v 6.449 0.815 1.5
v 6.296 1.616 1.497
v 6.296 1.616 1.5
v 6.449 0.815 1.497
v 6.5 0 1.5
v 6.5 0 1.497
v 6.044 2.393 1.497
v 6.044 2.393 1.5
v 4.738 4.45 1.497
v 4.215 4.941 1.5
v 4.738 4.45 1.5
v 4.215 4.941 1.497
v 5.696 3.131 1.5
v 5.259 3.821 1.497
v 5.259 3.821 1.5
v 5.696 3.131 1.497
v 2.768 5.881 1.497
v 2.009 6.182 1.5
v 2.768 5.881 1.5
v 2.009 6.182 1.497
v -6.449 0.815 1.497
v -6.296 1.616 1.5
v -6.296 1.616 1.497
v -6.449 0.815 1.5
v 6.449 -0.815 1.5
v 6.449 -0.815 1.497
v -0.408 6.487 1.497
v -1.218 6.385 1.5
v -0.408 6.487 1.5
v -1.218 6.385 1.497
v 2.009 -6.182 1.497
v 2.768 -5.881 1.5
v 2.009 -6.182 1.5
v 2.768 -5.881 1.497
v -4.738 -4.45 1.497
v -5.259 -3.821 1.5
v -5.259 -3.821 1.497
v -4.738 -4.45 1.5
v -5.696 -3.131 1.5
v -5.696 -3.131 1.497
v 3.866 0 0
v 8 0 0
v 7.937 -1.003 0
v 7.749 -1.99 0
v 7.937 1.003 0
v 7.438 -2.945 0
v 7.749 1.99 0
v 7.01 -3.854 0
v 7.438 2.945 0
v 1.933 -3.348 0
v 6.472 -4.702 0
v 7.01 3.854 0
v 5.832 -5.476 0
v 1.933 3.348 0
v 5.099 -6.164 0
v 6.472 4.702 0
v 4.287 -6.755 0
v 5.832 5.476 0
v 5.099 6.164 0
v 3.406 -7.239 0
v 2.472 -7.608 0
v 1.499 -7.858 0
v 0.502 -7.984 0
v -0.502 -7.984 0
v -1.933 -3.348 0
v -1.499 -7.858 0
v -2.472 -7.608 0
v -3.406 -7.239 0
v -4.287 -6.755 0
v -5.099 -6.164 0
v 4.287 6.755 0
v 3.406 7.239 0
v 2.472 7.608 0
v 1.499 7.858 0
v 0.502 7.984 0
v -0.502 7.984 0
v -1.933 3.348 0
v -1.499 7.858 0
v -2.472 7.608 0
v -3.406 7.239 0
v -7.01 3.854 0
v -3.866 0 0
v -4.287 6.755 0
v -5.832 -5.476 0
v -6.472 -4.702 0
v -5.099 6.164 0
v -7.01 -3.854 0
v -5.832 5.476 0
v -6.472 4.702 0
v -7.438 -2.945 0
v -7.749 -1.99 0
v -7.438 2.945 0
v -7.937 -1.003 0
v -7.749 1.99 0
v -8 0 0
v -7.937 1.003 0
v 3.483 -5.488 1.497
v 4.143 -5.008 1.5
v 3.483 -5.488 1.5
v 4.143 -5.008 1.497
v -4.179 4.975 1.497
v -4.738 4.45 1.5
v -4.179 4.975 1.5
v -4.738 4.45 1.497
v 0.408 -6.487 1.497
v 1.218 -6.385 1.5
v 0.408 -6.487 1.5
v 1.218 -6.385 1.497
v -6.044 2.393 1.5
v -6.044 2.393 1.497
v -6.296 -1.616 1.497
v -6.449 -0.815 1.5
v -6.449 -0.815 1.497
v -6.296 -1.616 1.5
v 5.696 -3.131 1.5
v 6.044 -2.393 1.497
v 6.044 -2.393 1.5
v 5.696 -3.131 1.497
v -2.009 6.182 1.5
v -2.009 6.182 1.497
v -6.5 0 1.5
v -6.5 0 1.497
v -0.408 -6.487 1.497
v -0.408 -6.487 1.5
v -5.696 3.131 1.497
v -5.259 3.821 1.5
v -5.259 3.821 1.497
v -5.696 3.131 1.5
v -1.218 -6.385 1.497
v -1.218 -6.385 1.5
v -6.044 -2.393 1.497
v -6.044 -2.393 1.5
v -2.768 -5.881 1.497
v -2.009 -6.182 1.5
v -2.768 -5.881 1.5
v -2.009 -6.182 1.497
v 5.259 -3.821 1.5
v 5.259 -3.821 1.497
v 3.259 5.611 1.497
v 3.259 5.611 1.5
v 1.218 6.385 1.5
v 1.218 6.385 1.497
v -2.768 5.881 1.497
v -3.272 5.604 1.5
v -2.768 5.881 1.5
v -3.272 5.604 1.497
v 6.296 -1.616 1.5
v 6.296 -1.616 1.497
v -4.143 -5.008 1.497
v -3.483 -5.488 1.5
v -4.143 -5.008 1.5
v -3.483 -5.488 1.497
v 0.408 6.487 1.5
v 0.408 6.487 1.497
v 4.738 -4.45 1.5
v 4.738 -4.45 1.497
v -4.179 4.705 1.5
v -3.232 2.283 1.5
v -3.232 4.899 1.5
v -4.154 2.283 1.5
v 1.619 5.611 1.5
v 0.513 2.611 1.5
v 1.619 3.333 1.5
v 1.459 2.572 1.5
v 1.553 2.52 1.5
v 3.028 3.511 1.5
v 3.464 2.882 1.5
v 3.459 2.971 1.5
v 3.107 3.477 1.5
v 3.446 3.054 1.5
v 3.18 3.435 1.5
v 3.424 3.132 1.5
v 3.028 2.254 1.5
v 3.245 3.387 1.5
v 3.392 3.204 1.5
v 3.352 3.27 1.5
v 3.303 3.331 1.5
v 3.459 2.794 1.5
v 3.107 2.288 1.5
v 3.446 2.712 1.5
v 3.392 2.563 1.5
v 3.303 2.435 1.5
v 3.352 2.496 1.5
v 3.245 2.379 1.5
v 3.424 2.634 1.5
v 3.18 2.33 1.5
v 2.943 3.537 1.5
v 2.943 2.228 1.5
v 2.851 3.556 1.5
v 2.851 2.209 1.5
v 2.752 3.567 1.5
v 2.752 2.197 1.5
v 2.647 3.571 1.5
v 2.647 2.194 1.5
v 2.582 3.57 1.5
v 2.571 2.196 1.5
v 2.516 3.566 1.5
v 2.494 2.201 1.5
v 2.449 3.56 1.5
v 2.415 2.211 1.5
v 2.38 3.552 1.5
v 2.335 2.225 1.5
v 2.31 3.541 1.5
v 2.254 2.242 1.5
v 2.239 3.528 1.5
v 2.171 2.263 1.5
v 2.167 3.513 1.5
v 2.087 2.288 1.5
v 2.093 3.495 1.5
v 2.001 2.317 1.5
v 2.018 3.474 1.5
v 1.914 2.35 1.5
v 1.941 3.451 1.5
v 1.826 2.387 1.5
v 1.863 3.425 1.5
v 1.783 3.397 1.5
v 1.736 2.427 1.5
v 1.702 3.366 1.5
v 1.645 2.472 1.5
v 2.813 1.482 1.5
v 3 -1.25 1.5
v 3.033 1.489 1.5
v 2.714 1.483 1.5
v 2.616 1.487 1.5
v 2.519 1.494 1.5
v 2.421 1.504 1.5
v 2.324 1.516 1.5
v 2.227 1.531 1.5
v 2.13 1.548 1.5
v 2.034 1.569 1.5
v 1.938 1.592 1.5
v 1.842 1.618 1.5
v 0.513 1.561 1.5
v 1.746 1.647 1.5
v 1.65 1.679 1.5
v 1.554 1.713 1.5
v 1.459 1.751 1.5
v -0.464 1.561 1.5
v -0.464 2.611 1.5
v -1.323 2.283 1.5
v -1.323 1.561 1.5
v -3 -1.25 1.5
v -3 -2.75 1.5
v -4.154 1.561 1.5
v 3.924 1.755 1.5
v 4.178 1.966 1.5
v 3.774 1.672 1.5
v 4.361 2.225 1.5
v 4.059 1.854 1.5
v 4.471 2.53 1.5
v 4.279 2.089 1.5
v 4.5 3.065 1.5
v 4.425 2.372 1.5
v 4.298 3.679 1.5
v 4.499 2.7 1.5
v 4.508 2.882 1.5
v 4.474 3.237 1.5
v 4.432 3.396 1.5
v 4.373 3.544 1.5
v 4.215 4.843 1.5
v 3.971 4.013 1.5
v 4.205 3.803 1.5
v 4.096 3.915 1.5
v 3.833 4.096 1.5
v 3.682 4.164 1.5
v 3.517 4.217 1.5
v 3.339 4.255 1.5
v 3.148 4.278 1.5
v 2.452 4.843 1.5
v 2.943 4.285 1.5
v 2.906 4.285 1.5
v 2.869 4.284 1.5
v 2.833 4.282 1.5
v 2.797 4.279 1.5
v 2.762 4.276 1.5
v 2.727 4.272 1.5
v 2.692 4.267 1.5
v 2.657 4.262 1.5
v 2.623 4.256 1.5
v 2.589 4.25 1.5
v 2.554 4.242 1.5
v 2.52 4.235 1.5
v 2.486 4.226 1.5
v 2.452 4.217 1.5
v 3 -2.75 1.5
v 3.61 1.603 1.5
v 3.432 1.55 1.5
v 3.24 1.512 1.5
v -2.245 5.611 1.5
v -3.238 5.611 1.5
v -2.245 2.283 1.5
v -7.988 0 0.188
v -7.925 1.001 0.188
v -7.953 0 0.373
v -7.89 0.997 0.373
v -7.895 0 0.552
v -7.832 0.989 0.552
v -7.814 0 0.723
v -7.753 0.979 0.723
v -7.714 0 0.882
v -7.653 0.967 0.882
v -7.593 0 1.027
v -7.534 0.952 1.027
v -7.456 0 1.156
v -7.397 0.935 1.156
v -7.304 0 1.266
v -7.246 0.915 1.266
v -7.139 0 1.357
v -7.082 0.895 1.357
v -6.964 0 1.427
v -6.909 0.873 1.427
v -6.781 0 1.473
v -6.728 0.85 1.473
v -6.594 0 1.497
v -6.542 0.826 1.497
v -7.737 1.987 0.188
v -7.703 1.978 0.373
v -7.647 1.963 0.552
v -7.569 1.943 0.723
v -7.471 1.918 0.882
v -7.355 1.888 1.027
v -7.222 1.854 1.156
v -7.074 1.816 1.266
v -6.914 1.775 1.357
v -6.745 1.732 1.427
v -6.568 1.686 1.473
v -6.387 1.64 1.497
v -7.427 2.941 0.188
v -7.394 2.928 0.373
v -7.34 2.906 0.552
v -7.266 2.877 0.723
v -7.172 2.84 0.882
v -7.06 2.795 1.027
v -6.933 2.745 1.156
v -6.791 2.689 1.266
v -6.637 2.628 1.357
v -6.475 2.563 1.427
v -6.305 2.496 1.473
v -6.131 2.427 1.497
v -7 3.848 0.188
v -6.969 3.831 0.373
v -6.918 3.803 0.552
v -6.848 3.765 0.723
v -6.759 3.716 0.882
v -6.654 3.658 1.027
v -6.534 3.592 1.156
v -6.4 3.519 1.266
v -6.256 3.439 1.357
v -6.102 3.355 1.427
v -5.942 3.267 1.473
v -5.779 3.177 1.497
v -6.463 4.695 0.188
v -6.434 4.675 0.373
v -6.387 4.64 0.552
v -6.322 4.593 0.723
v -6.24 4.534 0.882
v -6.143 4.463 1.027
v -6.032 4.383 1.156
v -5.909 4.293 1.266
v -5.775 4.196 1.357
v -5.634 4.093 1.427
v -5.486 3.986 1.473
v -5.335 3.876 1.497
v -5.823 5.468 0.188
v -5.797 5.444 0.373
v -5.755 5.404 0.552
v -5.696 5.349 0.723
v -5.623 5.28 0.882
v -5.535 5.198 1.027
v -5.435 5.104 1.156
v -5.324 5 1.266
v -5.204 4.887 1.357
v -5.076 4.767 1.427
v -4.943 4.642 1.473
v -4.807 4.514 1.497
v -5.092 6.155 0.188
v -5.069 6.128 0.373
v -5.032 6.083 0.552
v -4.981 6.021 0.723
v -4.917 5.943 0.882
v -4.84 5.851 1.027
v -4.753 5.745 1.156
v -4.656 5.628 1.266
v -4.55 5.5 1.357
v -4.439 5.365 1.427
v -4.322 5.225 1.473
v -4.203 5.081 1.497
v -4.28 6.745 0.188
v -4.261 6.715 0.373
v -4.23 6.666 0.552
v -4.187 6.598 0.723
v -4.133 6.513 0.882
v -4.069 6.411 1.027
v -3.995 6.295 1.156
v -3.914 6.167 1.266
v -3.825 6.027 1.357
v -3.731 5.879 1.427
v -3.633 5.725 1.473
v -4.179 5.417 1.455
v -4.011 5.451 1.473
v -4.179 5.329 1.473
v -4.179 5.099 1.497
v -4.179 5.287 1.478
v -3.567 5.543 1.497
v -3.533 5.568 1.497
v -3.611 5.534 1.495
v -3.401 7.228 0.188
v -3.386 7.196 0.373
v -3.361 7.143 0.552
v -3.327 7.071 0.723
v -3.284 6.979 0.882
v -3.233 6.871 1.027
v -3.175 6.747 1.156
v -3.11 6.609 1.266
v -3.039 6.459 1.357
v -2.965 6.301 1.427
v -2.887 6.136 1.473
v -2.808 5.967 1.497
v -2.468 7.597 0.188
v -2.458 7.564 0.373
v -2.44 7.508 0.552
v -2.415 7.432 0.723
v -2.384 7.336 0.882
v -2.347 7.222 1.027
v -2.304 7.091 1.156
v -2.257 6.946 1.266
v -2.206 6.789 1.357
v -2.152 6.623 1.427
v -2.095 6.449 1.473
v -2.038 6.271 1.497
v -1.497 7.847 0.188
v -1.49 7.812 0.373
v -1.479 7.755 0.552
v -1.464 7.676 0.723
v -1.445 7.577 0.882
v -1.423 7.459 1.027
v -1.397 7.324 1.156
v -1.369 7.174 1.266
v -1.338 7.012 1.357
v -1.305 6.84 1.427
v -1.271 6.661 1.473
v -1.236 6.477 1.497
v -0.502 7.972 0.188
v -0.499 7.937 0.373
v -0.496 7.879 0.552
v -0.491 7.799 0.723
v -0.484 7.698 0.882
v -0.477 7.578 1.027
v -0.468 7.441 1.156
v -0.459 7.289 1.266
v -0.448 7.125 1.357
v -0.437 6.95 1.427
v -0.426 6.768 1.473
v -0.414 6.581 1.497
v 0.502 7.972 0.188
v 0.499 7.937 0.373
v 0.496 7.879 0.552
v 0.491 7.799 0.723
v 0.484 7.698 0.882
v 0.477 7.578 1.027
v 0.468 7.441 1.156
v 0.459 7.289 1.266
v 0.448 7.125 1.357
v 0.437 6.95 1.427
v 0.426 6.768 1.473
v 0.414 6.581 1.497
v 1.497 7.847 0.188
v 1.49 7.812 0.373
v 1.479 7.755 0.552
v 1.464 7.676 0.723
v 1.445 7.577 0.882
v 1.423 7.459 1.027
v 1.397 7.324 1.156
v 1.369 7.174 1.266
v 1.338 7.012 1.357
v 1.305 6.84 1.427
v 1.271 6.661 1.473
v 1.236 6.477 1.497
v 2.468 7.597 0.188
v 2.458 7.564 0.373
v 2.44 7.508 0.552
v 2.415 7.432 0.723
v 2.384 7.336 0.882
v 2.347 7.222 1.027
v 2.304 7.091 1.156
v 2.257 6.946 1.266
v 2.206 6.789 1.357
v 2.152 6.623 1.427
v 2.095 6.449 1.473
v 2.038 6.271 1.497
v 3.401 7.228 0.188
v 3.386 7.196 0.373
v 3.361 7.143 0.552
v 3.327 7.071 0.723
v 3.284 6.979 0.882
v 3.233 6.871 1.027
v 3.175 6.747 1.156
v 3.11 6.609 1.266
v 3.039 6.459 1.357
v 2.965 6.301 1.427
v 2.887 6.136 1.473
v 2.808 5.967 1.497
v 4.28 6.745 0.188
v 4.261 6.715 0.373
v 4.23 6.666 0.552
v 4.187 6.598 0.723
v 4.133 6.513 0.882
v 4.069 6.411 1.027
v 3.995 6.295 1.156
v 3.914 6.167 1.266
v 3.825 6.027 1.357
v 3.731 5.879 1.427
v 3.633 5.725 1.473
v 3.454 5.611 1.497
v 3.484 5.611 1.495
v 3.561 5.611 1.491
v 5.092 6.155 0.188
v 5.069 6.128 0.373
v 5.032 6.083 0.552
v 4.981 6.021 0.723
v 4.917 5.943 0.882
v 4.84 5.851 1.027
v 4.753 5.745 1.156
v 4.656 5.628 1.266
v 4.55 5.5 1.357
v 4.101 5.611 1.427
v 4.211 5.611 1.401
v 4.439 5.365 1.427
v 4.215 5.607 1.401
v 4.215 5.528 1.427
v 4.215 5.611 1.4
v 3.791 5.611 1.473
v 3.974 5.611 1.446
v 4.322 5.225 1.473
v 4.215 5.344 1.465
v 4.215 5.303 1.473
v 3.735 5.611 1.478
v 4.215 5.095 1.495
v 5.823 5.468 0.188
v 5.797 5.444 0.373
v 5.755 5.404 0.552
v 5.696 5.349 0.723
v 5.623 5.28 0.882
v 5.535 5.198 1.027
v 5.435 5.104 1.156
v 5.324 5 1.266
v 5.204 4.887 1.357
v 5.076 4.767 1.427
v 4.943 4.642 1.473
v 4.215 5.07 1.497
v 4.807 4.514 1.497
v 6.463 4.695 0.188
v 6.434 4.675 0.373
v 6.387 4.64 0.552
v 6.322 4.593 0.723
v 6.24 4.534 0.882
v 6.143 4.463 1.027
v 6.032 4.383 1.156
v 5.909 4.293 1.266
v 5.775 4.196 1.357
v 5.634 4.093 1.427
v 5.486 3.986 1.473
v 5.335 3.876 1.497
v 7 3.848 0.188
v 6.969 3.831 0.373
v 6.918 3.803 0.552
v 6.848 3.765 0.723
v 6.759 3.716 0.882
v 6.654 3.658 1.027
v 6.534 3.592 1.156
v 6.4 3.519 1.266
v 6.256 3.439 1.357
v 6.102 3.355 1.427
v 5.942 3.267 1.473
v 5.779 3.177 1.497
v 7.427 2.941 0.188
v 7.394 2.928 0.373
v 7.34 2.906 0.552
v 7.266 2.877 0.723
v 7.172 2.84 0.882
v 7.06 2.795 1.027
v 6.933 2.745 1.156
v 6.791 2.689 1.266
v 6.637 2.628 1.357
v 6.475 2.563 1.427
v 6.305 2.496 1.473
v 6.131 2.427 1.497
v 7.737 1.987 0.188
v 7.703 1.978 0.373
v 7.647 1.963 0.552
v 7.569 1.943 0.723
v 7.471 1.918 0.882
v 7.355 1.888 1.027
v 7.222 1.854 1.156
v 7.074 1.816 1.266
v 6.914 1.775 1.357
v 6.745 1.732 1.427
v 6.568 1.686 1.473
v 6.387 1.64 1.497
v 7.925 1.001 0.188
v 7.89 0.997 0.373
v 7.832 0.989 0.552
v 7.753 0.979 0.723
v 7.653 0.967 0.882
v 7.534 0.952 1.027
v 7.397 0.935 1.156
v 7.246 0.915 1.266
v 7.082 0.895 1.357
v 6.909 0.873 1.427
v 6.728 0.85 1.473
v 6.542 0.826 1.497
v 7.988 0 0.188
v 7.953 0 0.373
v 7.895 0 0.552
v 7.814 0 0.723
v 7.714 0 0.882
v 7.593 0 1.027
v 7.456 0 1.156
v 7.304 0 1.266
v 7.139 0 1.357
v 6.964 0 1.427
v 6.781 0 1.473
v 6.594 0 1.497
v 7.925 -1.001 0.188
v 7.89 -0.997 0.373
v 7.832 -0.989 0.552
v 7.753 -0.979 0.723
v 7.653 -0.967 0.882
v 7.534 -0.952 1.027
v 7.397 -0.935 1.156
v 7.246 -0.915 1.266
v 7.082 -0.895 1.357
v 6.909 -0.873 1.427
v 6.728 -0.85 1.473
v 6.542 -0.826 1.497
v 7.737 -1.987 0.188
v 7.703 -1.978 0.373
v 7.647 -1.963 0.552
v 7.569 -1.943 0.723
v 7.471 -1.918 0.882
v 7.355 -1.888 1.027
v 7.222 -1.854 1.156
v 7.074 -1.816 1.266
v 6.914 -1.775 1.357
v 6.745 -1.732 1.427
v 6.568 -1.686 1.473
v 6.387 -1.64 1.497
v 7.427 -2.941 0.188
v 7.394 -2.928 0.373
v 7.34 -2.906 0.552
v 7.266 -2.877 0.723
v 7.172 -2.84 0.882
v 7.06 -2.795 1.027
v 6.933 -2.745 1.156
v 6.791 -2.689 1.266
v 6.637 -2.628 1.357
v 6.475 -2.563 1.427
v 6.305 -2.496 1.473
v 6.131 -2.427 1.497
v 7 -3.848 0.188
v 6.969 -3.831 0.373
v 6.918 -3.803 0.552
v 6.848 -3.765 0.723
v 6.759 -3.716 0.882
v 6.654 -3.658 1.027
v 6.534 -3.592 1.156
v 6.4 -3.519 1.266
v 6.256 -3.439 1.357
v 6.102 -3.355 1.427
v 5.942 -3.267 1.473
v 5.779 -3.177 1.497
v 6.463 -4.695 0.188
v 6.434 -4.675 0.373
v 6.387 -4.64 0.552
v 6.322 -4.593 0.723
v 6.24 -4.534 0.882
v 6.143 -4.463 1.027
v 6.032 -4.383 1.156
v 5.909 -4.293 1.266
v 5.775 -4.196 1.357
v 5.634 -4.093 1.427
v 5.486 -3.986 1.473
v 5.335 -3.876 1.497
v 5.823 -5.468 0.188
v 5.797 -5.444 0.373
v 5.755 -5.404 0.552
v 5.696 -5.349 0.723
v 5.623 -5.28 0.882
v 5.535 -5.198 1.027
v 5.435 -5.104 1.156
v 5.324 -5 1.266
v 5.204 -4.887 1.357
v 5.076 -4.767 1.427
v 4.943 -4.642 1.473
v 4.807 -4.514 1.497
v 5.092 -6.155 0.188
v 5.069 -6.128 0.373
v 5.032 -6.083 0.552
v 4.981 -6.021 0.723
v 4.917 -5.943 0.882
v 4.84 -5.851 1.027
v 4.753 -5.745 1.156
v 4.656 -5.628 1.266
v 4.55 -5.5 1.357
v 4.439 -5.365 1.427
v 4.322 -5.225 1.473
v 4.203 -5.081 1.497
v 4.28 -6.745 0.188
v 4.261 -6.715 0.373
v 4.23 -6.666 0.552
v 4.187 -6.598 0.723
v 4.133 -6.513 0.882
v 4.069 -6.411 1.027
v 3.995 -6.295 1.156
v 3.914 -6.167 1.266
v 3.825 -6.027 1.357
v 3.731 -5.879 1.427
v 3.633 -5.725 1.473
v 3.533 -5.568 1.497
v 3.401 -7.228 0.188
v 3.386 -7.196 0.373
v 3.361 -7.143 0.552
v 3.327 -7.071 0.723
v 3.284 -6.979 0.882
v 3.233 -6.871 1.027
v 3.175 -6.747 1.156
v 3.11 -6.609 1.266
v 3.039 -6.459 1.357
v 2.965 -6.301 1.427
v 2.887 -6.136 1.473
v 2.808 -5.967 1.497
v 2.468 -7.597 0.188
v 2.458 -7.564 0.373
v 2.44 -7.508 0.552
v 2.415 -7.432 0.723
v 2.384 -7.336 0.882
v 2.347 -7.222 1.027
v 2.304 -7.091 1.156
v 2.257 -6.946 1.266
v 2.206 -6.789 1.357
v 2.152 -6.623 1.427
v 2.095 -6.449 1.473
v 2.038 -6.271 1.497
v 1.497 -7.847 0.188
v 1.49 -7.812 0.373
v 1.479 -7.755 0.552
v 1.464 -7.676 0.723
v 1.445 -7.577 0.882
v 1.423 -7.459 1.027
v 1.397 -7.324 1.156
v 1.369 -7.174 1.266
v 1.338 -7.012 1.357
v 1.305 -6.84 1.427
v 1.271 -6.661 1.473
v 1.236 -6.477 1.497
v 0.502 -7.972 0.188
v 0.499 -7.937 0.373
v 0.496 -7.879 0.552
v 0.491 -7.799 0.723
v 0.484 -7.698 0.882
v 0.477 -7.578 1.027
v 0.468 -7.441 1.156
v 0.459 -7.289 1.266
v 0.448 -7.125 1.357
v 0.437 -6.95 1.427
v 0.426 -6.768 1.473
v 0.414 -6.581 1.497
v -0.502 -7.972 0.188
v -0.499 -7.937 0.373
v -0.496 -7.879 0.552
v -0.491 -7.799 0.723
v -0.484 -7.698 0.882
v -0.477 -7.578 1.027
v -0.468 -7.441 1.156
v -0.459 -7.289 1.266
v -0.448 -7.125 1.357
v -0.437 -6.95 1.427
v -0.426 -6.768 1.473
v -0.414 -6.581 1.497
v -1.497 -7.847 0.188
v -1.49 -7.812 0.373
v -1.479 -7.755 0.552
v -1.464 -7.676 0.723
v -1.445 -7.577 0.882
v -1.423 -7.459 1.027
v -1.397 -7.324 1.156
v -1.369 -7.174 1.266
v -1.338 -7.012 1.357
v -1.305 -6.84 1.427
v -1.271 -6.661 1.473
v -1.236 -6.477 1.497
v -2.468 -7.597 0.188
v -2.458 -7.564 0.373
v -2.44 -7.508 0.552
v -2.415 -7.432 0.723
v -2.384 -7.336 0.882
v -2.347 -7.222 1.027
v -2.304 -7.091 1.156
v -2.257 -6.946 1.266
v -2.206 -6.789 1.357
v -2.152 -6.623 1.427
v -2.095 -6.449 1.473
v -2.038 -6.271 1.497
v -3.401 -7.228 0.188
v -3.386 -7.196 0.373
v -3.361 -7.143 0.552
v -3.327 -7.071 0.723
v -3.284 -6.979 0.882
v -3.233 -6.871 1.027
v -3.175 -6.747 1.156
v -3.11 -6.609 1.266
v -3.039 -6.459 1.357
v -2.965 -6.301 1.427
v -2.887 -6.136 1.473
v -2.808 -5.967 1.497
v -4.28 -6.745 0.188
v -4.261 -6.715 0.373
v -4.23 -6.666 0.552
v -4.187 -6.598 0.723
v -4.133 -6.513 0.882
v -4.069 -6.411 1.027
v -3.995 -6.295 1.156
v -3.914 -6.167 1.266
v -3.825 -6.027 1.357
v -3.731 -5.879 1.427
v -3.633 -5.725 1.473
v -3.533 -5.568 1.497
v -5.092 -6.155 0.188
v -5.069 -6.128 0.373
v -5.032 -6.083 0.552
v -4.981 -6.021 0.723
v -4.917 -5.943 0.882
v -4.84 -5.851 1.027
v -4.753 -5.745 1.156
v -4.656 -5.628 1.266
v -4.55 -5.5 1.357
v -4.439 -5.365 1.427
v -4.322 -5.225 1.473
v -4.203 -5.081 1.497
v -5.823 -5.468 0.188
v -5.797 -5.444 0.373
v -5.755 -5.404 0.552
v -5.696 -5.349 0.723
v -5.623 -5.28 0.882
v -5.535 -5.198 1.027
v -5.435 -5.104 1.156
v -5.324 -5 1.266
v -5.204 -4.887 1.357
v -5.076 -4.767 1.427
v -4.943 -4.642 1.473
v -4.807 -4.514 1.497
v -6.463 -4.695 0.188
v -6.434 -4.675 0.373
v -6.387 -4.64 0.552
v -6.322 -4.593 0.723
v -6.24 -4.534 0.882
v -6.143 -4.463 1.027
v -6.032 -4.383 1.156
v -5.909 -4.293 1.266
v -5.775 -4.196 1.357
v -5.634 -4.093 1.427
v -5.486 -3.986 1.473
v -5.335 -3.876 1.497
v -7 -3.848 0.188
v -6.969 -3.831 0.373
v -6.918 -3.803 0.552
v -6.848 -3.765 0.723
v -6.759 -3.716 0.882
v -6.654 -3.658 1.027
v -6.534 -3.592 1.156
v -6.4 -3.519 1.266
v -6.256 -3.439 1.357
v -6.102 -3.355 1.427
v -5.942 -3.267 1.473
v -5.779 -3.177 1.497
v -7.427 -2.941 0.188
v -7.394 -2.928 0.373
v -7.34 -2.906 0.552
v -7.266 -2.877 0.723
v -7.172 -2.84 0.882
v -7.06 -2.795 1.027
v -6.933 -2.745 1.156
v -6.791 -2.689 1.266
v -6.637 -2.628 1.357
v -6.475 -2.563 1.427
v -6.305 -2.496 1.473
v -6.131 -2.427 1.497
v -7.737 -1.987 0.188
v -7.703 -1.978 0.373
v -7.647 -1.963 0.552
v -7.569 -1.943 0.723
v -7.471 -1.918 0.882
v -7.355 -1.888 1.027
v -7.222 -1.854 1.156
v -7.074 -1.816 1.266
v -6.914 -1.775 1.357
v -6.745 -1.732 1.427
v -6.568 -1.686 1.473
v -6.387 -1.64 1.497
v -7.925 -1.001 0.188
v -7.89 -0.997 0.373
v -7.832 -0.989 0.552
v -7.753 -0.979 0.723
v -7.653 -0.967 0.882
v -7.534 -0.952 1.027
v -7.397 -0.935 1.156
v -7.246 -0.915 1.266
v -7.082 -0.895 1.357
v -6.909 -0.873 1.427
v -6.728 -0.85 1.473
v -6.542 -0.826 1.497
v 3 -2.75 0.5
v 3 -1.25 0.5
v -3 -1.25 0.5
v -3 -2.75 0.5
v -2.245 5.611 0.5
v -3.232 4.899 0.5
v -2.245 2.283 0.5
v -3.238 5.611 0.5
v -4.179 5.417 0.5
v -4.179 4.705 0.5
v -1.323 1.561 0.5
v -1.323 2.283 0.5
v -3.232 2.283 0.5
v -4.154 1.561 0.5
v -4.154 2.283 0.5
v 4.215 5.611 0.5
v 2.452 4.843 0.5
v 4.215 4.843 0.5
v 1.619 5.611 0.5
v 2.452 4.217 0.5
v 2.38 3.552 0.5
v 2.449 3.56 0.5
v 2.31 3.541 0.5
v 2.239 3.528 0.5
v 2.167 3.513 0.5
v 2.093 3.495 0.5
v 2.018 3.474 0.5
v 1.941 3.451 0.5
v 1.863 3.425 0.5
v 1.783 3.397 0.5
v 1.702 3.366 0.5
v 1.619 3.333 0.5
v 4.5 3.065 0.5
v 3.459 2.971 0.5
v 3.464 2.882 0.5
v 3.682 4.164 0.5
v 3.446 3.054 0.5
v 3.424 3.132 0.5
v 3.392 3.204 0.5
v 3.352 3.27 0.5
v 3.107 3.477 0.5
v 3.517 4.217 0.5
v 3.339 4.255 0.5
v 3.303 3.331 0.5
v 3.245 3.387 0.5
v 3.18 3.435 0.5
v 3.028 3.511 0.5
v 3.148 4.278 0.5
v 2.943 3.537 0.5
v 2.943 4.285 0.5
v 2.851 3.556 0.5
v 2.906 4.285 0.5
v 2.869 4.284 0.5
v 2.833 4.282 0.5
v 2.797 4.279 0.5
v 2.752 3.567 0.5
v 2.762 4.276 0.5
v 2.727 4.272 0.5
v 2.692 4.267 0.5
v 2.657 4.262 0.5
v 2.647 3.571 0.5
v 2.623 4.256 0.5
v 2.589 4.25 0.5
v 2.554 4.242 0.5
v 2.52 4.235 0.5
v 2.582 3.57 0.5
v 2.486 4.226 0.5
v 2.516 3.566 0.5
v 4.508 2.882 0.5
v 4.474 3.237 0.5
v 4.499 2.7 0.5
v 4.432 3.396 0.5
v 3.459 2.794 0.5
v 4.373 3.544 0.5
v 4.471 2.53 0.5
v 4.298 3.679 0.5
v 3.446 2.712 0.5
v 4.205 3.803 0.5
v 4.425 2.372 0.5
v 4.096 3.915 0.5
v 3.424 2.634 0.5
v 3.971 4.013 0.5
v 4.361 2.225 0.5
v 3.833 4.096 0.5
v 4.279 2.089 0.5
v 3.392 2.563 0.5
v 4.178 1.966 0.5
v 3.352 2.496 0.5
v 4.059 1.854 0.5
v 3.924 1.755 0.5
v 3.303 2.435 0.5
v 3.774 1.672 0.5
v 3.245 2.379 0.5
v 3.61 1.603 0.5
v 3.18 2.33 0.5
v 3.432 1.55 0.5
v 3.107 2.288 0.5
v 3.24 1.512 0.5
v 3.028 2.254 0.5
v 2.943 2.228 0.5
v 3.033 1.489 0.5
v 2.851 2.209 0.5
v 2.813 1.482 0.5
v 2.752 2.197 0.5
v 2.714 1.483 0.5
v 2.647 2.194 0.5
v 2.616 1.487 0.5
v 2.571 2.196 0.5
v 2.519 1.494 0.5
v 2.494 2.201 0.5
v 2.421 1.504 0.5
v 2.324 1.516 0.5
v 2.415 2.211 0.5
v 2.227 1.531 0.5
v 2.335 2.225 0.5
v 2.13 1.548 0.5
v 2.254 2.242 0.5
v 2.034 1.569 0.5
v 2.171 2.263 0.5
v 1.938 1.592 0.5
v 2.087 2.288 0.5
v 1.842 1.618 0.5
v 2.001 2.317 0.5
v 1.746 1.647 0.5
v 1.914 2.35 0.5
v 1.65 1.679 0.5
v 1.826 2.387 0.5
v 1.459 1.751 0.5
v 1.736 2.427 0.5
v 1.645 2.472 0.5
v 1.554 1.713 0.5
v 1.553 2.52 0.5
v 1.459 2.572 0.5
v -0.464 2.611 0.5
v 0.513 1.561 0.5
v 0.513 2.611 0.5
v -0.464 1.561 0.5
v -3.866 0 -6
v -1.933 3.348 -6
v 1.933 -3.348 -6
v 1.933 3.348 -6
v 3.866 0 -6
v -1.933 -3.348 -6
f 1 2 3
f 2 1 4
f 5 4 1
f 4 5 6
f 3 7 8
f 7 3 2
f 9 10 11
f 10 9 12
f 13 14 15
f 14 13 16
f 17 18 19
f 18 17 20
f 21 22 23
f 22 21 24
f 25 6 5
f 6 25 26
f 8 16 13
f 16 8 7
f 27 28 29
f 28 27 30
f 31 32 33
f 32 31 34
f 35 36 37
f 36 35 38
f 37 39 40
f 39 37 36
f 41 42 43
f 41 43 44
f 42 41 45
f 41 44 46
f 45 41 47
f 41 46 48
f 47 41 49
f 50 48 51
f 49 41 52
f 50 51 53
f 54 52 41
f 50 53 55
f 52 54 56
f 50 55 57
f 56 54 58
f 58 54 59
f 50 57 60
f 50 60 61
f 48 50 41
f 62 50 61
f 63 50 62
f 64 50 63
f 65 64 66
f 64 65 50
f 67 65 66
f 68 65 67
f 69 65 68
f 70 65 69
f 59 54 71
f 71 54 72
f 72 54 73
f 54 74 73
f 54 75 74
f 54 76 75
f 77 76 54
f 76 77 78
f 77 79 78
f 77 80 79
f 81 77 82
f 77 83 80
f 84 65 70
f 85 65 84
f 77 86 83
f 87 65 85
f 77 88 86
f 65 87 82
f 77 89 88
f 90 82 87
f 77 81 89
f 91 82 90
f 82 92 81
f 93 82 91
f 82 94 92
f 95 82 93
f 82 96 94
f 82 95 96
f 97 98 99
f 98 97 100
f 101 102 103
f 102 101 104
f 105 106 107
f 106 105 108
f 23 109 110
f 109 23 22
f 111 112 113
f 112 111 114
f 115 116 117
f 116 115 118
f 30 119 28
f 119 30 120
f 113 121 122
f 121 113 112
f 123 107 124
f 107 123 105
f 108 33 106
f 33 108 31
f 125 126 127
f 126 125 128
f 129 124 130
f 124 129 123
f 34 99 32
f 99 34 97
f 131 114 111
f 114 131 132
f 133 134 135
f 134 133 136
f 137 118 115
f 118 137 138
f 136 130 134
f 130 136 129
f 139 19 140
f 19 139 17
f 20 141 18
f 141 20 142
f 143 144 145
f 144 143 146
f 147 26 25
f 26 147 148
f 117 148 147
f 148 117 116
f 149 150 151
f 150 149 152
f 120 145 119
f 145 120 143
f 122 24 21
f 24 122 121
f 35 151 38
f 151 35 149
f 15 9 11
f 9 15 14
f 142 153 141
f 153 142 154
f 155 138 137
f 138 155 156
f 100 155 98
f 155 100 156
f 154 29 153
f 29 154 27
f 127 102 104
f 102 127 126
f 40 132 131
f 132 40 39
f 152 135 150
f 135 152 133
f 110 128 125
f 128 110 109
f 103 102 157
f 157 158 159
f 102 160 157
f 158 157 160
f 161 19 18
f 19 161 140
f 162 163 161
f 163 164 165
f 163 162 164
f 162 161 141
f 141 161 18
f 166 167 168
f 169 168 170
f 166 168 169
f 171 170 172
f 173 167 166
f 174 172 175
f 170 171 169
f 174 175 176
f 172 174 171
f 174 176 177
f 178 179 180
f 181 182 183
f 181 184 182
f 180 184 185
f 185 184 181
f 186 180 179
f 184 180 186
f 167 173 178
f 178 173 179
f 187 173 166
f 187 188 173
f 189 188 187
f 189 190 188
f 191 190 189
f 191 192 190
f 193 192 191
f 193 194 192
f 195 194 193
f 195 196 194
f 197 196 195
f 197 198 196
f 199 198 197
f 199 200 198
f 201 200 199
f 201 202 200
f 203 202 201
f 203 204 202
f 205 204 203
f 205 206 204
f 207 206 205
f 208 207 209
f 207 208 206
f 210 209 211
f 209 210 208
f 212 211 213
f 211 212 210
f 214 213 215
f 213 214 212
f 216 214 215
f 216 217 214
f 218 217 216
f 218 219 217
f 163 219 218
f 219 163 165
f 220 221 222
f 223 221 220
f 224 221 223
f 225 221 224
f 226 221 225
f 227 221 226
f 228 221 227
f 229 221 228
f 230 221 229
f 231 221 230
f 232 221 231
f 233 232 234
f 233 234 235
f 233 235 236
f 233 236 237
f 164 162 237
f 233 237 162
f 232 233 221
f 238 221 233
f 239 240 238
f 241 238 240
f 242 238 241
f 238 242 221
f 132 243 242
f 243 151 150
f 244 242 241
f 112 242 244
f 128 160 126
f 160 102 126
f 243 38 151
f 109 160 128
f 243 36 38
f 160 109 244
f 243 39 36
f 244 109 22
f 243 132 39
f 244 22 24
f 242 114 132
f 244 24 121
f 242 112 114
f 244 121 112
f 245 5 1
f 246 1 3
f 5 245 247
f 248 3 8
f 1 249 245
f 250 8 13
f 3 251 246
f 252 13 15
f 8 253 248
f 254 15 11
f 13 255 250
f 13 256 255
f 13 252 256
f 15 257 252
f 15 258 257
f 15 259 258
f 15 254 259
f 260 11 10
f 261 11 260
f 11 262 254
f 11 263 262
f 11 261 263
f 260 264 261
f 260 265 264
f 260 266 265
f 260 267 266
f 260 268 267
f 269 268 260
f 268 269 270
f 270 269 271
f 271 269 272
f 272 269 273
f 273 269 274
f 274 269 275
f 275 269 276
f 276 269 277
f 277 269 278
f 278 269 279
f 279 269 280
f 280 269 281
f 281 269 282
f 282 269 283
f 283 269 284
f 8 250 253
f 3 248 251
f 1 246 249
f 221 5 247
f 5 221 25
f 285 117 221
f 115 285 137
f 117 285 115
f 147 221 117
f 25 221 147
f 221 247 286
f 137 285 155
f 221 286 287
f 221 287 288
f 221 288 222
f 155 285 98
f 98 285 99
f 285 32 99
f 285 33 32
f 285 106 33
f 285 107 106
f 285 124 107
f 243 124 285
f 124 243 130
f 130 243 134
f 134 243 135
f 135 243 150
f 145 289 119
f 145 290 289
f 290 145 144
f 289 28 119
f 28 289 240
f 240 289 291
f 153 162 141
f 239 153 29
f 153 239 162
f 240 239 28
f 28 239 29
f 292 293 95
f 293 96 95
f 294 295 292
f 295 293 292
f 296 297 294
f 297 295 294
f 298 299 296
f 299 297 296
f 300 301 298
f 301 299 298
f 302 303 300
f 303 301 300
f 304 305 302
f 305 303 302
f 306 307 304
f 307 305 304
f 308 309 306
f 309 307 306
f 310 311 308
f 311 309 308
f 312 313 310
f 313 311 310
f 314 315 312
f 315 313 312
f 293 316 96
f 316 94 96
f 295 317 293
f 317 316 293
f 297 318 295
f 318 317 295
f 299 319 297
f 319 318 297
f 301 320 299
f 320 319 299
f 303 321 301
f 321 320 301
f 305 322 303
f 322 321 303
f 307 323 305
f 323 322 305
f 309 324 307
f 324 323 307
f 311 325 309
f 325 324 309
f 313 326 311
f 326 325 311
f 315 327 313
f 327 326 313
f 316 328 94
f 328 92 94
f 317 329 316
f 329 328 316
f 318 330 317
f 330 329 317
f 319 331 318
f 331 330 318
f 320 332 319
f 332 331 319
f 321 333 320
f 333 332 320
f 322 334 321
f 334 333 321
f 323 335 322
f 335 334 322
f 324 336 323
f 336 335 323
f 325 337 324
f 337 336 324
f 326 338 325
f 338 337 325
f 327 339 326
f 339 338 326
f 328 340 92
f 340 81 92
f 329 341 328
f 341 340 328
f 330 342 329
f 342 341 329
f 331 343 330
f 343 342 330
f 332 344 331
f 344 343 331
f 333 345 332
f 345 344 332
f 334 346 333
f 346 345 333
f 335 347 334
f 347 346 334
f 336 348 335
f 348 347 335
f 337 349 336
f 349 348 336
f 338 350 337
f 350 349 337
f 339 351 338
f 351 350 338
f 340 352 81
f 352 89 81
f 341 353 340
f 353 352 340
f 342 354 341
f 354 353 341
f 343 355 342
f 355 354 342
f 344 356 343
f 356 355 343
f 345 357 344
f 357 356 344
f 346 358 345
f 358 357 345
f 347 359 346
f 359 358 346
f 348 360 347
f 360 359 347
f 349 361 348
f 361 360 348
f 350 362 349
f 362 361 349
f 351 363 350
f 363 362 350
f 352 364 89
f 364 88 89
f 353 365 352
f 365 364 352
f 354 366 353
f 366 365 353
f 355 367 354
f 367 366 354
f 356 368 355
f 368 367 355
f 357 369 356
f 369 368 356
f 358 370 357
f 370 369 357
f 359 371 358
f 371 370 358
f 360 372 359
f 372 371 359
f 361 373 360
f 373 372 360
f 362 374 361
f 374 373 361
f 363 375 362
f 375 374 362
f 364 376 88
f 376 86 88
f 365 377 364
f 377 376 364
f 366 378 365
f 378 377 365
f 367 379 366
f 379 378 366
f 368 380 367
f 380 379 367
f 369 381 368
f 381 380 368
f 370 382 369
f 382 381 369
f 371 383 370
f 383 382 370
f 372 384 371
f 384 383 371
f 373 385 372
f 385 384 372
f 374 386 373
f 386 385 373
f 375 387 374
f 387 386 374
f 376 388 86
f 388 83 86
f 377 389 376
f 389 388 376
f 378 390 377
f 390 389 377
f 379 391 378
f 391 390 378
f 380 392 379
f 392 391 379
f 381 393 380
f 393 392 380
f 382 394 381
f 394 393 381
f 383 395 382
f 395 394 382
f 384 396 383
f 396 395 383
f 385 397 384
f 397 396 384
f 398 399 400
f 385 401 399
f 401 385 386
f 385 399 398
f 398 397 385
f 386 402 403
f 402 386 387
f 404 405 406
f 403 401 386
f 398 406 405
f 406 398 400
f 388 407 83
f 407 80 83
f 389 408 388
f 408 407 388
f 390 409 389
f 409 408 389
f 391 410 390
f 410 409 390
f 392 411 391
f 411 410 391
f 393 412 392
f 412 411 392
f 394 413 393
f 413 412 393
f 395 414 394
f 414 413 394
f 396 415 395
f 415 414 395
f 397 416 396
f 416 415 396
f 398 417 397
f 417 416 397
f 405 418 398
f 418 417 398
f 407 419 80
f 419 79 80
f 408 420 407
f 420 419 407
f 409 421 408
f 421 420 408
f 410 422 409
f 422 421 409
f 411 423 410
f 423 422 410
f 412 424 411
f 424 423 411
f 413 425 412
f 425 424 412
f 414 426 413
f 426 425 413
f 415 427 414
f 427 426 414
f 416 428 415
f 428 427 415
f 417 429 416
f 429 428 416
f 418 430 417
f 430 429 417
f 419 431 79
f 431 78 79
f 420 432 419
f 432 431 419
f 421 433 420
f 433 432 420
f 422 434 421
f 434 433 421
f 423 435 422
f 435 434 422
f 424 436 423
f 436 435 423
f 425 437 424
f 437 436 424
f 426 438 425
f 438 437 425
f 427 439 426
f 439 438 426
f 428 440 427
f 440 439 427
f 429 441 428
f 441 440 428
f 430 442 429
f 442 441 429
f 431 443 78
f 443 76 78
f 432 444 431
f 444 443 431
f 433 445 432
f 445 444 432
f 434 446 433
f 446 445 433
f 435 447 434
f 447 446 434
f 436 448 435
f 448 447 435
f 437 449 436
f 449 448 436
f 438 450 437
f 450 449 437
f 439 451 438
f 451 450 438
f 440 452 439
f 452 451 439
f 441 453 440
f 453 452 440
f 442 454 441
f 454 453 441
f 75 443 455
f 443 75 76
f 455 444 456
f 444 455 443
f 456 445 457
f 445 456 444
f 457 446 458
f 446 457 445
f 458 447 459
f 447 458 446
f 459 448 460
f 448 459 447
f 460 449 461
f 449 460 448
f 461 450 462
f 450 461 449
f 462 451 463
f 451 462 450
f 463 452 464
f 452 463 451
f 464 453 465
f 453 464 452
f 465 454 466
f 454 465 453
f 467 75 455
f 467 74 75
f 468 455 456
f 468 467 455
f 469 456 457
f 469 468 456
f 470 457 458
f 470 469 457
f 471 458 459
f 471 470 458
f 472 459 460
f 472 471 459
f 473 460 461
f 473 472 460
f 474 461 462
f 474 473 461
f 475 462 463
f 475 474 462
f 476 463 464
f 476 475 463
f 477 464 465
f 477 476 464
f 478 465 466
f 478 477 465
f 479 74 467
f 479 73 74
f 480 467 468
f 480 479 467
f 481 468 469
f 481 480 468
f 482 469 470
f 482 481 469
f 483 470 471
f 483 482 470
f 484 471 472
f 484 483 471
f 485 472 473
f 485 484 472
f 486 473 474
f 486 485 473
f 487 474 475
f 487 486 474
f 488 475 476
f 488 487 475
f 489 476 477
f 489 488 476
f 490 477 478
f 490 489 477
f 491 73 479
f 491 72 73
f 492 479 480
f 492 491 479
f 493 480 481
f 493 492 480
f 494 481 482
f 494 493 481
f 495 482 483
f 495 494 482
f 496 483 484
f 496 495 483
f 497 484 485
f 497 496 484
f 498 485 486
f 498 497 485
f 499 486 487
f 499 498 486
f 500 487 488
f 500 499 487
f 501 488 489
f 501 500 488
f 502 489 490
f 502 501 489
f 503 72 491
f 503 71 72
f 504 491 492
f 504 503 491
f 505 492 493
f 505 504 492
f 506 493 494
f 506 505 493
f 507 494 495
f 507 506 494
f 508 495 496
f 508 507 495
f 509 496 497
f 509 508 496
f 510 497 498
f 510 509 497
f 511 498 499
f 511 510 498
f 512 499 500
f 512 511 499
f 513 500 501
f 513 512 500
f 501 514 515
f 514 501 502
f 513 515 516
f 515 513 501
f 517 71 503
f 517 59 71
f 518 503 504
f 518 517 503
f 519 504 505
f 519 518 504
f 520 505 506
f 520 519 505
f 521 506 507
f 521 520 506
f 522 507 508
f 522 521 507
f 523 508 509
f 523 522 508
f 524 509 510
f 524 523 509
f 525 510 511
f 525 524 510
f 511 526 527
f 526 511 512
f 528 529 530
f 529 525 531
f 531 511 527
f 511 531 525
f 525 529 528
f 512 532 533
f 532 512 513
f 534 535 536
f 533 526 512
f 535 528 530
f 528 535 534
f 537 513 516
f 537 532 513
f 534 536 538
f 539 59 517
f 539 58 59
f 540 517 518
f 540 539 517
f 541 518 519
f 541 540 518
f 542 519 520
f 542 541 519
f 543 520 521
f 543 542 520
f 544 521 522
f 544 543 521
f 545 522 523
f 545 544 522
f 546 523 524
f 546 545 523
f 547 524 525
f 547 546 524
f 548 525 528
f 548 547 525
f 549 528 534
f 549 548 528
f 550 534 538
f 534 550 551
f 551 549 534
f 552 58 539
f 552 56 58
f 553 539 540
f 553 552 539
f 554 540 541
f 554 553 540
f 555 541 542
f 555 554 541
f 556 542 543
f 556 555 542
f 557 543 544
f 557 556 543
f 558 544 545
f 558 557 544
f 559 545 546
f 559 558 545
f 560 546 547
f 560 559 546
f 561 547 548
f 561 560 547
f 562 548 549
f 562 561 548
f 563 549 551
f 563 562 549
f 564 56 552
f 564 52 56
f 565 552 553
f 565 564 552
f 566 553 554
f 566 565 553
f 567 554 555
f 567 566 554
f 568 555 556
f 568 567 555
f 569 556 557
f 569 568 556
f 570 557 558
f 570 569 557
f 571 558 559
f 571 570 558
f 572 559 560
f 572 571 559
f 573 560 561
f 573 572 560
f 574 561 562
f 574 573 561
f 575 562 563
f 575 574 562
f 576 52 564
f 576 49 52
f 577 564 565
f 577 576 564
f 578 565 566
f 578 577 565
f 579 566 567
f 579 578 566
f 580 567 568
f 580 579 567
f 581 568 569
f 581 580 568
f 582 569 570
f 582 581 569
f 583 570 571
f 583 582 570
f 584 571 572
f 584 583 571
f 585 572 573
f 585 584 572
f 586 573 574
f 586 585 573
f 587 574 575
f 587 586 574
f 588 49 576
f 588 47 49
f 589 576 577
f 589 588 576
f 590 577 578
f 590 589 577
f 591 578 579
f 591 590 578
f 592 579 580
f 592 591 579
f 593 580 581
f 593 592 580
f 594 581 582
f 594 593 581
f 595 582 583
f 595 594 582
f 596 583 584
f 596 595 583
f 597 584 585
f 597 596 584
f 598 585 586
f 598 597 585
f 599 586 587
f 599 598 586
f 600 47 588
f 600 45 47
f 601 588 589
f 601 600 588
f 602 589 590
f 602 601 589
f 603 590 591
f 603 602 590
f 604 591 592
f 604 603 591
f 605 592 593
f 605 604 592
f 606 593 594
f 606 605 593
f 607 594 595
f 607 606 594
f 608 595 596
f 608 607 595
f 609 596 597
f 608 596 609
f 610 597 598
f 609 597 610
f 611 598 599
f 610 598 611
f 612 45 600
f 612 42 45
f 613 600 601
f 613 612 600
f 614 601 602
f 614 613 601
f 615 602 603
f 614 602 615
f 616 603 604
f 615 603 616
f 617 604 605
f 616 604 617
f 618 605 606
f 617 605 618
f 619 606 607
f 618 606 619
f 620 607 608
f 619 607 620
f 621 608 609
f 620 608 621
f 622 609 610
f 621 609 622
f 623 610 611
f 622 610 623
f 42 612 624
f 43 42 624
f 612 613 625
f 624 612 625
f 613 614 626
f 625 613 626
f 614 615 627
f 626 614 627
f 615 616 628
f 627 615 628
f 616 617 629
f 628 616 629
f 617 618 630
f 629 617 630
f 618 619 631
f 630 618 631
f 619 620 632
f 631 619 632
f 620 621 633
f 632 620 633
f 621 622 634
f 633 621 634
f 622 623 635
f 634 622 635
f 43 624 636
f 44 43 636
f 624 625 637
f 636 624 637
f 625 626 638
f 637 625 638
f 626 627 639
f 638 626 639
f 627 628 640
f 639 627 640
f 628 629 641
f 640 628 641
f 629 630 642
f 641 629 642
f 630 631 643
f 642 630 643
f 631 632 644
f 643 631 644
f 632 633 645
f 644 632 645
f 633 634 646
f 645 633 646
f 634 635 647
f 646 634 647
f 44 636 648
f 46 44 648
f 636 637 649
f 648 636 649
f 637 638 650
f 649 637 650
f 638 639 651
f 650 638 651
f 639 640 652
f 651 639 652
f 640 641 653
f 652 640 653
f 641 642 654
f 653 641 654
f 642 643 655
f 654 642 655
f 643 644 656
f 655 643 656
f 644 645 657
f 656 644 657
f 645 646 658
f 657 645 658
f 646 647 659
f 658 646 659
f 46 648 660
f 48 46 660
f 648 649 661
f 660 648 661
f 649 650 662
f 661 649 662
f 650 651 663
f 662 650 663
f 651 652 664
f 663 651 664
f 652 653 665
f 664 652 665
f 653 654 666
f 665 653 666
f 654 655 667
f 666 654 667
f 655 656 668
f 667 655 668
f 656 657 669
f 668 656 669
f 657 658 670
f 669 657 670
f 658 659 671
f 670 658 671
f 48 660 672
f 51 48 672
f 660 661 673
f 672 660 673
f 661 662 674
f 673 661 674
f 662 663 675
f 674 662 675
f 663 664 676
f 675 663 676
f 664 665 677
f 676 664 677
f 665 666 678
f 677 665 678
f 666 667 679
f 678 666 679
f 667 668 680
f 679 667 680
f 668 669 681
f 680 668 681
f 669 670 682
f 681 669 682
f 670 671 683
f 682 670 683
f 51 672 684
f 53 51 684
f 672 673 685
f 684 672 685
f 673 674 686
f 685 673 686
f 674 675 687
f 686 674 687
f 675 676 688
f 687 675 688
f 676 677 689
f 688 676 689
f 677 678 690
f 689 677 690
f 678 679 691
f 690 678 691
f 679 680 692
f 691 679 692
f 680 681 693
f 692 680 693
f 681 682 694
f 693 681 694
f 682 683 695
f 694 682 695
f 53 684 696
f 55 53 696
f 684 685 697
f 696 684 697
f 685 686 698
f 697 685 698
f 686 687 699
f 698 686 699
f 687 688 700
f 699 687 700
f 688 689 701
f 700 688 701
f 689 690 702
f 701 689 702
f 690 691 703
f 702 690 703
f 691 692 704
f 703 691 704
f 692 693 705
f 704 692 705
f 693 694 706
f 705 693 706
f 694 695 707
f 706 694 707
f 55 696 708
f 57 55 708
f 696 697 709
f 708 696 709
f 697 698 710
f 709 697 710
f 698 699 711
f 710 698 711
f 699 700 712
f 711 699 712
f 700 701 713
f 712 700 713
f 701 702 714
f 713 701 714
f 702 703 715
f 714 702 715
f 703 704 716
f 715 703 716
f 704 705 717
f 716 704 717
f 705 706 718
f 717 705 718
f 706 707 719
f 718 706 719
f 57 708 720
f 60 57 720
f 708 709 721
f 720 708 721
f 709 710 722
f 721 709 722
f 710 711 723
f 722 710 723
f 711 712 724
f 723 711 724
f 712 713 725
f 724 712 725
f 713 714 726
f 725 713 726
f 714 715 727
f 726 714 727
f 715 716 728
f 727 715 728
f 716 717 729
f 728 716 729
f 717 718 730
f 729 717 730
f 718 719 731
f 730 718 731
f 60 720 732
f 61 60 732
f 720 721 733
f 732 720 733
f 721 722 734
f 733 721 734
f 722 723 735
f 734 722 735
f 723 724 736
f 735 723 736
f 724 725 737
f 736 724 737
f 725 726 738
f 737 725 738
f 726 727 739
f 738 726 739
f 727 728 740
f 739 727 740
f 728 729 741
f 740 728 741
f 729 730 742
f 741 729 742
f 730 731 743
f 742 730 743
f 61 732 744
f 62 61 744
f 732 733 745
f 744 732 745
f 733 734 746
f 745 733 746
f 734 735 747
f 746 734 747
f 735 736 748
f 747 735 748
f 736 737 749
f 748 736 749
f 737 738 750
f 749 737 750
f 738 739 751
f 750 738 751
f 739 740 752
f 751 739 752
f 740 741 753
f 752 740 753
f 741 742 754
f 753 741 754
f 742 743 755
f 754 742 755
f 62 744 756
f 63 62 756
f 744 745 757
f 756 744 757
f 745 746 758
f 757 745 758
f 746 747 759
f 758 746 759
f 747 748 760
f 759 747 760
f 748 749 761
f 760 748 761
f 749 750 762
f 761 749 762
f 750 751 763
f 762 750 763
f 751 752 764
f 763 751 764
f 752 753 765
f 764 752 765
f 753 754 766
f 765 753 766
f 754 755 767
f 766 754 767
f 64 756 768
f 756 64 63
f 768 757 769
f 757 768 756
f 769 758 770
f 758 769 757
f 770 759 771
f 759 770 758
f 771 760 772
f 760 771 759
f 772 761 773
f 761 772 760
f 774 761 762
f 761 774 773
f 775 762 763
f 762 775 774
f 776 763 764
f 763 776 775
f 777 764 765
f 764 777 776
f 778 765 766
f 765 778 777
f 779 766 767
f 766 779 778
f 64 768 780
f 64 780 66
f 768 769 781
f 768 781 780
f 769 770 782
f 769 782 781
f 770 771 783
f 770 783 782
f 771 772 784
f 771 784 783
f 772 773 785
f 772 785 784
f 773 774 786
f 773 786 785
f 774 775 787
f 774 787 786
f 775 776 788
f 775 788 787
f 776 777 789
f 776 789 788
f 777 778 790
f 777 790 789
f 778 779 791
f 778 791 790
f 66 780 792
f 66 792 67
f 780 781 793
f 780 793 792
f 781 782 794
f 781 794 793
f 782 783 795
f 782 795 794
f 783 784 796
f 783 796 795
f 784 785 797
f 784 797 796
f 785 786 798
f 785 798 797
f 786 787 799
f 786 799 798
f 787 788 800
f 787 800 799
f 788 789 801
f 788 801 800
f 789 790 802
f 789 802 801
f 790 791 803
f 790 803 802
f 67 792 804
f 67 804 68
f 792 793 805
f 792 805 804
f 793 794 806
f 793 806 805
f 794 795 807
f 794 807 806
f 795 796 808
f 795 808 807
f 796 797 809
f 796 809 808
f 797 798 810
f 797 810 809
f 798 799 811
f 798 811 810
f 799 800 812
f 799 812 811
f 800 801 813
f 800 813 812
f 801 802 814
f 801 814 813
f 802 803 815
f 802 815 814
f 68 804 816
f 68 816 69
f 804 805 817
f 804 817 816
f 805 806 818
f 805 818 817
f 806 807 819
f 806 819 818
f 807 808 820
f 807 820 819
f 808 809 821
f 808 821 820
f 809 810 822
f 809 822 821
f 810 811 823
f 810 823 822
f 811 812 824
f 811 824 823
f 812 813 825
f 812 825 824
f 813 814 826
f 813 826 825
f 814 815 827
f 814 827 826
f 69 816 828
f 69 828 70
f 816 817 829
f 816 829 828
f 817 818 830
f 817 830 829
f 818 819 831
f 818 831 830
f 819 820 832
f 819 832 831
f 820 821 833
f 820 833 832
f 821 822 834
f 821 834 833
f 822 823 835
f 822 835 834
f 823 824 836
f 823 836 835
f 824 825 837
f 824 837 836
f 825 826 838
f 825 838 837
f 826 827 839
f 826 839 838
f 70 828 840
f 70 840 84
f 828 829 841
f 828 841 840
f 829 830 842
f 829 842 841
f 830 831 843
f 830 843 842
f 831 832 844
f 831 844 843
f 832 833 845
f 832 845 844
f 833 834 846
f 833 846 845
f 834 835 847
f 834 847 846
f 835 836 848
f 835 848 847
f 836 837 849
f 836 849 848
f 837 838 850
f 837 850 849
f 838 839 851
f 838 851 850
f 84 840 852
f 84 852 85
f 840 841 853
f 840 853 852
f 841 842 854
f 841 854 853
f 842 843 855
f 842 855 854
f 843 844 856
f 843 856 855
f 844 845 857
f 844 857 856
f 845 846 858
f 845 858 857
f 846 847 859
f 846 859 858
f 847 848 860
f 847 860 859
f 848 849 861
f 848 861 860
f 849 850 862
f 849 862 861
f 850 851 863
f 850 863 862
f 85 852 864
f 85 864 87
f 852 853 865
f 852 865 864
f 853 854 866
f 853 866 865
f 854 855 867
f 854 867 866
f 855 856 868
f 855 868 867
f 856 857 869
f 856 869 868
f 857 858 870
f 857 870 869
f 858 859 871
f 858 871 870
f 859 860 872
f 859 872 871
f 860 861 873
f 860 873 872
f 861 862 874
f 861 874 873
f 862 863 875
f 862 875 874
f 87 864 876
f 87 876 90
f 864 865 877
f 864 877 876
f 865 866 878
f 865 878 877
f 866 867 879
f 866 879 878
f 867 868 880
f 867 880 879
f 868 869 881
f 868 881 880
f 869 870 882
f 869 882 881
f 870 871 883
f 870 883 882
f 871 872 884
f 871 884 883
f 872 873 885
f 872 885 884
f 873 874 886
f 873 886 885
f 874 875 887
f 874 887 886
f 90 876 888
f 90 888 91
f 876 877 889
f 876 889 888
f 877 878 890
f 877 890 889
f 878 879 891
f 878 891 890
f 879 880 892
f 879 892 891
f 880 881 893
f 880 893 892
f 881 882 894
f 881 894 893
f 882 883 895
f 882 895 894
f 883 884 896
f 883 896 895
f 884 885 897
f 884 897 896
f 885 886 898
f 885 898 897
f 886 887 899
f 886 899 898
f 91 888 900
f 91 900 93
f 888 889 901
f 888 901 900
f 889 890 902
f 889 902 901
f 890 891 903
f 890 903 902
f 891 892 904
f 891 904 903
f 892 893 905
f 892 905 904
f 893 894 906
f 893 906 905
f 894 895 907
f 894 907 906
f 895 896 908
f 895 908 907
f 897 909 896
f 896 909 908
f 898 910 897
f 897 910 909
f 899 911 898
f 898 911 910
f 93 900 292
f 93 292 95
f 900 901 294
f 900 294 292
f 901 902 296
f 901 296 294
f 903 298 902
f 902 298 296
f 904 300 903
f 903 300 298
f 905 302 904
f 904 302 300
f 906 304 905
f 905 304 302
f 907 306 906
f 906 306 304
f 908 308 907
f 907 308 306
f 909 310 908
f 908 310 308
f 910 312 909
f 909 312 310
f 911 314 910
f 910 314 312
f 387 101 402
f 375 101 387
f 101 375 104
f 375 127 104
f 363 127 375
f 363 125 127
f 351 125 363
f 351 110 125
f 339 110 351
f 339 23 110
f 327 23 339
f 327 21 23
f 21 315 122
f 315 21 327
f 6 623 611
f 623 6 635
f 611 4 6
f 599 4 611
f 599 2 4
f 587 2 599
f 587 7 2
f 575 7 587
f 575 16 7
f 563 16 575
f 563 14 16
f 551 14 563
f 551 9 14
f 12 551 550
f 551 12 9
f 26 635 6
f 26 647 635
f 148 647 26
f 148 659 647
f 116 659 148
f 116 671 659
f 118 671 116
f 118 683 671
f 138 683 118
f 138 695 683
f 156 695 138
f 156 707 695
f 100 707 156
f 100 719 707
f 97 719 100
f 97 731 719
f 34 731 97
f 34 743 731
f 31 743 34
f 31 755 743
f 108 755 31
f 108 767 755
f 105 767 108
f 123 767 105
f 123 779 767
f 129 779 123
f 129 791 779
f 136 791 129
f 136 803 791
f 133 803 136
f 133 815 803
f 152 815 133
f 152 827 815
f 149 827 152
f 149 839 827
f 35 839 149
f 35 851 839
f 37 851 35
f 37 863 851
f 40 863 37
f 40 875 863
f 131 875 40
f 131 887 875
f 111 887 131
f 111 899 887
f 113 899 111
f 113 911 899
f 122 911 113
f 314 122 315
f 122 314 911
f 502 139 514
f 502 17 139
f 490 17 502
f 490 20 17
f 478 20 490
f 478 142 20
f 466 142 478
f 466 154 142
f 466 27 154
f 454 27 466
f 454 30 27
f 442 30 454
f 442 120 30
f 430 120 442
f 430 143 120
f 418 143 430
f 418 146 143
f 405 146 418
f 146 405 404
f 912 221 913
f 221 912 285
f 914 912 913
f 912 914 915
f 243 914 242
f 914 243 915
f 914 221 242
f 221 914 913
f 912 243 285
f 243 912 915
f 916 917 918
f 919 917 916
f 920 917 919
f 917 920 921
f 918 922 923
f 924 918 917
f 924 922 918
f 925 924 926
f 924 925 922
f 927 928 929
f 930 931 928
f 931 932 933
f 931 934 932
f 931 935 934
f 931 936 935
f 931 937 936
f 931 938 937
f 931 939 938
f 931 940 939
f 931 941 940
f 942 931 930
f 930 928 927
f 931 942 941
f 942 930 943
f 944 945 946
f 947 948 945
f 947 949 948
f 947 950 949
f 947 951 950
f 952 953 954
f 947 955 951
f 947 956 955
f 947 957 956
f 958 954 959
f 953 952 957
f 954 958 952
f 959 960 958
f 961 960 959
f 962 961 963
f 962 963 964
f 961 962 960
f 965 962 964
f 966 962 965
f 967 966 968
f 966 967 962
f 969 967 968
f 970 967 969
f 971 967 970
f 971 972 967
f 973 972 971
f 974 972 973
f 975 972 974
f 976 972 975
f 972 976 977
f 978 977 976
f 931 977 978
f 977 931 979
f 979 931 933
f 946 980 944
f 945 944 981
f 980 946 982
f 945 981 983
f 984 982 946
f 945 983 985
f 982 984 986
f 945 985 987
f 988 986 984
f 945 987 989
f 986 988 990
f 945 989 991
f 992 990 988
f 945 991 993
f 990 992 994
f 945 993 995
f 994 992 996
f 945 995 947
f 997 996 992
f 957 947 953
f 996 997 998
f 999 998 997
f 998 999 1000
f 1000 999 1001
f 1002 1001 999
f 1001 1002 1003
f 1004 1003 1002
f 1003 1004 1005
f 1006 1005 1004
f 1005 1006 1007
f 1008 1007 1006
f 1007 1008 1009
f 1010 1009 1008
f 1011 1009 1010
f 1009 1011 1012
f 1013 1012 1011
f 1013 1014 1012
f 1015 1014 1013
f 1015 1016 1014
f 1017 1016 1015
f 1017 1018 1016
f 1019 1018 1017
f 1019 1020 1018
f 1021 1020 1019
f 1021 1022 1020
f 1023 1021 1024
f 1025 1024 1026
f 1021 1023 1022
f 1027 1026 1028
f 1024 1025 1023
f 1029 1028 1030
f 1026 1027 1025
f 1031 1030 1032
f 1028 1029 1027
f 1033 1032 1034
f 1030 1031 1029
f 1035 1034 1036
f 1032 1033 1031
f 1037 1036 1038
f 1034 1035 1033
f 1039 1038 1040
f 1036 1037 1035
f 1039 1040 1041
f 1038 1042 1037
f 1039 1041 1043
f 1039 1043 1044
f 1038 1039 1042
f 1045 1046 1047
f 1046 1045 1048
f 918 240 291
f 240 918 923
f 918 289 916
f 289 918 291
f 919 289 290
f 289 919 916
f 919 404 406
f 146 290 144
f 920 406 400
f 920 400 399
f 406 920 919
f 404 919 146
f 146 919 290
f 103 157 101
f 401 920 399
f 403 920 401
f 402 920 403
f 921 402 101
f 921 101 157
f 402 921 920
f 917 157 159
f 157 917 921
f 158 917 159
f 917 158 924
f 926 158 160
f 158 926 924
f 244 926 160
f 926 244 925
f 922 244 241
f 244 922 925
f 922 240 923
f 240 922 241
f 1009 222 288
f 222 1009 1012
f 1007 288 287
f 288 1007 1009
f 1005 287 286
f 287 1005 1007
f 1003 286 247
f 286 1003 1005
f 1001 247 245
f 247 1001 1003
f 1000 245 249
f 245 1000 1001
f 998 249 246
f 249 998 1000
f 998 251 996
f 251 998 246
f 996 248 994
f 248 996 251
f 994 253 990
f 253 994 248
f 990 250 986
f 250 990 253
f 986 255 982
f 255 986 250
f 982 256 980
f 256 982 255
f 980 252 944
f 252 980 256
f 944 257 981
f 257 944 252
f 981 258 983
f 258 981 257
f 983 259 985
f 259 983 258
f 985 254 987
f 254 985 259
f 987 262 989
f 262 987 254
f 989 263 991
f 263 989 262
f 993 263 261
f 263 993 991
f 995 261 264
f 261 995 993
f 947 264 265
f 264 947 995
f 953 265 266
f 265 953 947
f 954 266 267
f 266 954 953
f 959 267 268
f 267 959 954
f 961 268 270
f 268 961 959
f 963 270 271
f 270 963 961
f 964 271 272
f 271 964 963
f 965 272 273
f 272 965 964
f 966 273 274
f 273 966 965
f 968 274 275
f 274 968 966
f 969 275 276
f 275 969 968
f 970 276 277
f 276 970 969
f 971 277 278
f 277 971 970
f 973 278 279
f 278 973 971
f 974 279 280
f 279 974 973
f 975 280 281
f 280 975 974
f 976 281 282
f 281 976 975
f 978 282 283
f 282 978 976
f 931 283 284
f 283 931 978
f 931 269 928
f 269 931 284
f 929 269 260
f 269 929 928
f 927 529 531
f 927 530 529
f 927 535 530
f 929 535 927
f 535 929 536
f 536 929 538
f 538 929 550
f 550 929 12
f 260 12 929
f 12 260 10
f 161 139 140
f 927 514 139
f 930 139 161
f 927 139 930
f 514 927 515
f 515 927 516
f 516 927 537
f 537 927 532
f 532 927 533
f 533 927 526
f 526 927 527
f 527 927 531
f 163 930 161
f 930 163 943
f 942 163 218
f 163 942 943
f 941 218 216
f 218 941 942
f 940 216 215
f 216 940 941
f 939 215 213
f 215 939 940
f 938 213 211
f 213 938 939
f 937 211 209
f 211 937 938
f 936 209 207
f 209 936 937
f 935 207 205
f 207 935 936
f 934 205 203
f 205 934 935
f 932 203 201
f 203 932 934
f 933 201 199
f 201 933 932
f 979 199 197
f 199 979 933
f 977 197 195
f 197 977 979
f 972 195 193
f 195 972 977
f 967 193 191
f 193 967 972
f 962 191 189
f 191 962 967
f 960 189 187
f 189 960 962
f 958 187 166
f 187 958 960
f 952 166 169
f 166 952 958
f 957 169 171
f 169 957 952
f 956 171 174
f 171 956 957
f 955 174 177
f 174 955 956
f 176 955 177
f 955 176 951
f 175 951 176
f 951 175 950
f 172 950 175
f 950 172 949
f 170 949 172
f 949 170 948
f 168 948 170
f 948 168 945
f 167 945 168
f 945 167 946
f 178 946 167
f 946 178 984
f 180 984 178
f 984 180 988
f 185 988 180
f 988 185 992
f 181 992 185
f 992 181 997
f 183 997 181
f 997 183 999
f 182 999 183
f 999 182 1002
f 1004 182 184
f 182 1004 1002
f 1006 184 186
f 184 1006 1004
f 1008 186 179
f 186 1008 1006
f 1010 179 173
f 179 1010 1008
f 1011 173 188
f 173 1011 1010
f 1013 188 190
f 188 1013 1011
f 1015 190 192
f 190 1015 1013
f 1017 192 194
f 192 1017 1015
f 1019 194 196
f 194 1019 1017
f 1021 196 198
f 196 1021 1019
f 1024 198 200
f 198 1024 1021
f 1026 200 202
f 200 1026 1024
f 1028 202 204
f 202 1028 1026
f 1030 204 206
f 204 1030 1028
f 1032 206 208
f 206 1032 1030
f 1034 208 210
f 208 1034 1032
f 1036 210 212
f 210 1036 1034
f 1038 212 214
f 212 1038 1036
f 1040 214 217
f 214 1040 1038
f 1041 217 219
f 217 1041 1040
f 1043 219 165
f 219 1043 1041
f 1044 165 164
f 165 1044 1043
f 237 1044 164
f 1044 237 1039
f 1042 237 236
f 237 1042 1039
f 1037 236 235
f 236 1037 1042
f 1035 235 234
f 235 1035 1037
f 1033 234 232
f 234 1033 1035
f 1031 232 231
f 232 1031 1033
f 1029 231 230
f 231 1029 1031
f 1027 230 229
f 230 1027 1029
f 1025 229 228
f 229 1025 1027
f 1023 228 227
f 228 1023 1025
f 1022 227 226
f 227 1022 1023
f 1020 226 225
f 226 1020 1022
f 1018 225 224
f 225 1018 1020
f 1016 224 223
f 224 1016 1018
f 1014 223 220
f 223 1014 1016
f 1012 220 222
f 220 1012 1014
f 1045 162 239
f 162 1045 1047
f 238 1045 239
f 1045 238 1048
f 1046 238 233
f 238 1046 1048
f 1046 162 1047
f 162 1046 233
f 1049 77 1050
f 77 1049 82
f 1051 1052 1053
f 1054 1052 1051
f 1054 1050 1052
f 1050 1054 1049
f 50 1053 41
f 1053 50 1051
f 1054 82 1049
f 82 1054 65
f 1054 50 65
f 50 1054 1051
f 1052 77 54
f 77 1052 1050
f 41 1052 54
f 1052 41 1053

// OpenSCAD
$fn = 50;


union() {
	difference() {
		union() {
			cylinder(h = 1.5000000000, r = 6.5000000000);
			rotate_extrude(angle = 360) {
				translate(v = [6.5000000000, 0, 0]) {
					circle(r = 1.5000000000);
				}
			}
		}
		union() {
			translate(v = [-25.0000000000, -25.0000000000, -50]) {
				cube(size = [50, 50, 50]);
			}
			#translate(v = [-3.0000000000, -2.7500000000, 0.5000000000]) {
				cube(size = [6, 1.5000000000, 1]);
			}
			#translate(v = [0, 3.5000000000, 0.5000000000]) {
				linear_extrude(height = 1) {
					text(font = "SegoiUI:Bold", halign = "center", size = 4, text = "1.5", valign = "center");
				}
			}
		}
	}
	union() {
		translate(v = [0, 0, -6]) {
			linear_extrude(height = 6) {
				polygon(points = [[3.8658550000, 0.0000000000], [1.9329275000, 3.3479286373], [-1.9329275000, 3.3479286373], [-3.8658550000, 0.0000000000], [-1.9329275000, -3.3479286373], [1.9329275000, -3.3479286373]]);
			}
		}
	}
}
